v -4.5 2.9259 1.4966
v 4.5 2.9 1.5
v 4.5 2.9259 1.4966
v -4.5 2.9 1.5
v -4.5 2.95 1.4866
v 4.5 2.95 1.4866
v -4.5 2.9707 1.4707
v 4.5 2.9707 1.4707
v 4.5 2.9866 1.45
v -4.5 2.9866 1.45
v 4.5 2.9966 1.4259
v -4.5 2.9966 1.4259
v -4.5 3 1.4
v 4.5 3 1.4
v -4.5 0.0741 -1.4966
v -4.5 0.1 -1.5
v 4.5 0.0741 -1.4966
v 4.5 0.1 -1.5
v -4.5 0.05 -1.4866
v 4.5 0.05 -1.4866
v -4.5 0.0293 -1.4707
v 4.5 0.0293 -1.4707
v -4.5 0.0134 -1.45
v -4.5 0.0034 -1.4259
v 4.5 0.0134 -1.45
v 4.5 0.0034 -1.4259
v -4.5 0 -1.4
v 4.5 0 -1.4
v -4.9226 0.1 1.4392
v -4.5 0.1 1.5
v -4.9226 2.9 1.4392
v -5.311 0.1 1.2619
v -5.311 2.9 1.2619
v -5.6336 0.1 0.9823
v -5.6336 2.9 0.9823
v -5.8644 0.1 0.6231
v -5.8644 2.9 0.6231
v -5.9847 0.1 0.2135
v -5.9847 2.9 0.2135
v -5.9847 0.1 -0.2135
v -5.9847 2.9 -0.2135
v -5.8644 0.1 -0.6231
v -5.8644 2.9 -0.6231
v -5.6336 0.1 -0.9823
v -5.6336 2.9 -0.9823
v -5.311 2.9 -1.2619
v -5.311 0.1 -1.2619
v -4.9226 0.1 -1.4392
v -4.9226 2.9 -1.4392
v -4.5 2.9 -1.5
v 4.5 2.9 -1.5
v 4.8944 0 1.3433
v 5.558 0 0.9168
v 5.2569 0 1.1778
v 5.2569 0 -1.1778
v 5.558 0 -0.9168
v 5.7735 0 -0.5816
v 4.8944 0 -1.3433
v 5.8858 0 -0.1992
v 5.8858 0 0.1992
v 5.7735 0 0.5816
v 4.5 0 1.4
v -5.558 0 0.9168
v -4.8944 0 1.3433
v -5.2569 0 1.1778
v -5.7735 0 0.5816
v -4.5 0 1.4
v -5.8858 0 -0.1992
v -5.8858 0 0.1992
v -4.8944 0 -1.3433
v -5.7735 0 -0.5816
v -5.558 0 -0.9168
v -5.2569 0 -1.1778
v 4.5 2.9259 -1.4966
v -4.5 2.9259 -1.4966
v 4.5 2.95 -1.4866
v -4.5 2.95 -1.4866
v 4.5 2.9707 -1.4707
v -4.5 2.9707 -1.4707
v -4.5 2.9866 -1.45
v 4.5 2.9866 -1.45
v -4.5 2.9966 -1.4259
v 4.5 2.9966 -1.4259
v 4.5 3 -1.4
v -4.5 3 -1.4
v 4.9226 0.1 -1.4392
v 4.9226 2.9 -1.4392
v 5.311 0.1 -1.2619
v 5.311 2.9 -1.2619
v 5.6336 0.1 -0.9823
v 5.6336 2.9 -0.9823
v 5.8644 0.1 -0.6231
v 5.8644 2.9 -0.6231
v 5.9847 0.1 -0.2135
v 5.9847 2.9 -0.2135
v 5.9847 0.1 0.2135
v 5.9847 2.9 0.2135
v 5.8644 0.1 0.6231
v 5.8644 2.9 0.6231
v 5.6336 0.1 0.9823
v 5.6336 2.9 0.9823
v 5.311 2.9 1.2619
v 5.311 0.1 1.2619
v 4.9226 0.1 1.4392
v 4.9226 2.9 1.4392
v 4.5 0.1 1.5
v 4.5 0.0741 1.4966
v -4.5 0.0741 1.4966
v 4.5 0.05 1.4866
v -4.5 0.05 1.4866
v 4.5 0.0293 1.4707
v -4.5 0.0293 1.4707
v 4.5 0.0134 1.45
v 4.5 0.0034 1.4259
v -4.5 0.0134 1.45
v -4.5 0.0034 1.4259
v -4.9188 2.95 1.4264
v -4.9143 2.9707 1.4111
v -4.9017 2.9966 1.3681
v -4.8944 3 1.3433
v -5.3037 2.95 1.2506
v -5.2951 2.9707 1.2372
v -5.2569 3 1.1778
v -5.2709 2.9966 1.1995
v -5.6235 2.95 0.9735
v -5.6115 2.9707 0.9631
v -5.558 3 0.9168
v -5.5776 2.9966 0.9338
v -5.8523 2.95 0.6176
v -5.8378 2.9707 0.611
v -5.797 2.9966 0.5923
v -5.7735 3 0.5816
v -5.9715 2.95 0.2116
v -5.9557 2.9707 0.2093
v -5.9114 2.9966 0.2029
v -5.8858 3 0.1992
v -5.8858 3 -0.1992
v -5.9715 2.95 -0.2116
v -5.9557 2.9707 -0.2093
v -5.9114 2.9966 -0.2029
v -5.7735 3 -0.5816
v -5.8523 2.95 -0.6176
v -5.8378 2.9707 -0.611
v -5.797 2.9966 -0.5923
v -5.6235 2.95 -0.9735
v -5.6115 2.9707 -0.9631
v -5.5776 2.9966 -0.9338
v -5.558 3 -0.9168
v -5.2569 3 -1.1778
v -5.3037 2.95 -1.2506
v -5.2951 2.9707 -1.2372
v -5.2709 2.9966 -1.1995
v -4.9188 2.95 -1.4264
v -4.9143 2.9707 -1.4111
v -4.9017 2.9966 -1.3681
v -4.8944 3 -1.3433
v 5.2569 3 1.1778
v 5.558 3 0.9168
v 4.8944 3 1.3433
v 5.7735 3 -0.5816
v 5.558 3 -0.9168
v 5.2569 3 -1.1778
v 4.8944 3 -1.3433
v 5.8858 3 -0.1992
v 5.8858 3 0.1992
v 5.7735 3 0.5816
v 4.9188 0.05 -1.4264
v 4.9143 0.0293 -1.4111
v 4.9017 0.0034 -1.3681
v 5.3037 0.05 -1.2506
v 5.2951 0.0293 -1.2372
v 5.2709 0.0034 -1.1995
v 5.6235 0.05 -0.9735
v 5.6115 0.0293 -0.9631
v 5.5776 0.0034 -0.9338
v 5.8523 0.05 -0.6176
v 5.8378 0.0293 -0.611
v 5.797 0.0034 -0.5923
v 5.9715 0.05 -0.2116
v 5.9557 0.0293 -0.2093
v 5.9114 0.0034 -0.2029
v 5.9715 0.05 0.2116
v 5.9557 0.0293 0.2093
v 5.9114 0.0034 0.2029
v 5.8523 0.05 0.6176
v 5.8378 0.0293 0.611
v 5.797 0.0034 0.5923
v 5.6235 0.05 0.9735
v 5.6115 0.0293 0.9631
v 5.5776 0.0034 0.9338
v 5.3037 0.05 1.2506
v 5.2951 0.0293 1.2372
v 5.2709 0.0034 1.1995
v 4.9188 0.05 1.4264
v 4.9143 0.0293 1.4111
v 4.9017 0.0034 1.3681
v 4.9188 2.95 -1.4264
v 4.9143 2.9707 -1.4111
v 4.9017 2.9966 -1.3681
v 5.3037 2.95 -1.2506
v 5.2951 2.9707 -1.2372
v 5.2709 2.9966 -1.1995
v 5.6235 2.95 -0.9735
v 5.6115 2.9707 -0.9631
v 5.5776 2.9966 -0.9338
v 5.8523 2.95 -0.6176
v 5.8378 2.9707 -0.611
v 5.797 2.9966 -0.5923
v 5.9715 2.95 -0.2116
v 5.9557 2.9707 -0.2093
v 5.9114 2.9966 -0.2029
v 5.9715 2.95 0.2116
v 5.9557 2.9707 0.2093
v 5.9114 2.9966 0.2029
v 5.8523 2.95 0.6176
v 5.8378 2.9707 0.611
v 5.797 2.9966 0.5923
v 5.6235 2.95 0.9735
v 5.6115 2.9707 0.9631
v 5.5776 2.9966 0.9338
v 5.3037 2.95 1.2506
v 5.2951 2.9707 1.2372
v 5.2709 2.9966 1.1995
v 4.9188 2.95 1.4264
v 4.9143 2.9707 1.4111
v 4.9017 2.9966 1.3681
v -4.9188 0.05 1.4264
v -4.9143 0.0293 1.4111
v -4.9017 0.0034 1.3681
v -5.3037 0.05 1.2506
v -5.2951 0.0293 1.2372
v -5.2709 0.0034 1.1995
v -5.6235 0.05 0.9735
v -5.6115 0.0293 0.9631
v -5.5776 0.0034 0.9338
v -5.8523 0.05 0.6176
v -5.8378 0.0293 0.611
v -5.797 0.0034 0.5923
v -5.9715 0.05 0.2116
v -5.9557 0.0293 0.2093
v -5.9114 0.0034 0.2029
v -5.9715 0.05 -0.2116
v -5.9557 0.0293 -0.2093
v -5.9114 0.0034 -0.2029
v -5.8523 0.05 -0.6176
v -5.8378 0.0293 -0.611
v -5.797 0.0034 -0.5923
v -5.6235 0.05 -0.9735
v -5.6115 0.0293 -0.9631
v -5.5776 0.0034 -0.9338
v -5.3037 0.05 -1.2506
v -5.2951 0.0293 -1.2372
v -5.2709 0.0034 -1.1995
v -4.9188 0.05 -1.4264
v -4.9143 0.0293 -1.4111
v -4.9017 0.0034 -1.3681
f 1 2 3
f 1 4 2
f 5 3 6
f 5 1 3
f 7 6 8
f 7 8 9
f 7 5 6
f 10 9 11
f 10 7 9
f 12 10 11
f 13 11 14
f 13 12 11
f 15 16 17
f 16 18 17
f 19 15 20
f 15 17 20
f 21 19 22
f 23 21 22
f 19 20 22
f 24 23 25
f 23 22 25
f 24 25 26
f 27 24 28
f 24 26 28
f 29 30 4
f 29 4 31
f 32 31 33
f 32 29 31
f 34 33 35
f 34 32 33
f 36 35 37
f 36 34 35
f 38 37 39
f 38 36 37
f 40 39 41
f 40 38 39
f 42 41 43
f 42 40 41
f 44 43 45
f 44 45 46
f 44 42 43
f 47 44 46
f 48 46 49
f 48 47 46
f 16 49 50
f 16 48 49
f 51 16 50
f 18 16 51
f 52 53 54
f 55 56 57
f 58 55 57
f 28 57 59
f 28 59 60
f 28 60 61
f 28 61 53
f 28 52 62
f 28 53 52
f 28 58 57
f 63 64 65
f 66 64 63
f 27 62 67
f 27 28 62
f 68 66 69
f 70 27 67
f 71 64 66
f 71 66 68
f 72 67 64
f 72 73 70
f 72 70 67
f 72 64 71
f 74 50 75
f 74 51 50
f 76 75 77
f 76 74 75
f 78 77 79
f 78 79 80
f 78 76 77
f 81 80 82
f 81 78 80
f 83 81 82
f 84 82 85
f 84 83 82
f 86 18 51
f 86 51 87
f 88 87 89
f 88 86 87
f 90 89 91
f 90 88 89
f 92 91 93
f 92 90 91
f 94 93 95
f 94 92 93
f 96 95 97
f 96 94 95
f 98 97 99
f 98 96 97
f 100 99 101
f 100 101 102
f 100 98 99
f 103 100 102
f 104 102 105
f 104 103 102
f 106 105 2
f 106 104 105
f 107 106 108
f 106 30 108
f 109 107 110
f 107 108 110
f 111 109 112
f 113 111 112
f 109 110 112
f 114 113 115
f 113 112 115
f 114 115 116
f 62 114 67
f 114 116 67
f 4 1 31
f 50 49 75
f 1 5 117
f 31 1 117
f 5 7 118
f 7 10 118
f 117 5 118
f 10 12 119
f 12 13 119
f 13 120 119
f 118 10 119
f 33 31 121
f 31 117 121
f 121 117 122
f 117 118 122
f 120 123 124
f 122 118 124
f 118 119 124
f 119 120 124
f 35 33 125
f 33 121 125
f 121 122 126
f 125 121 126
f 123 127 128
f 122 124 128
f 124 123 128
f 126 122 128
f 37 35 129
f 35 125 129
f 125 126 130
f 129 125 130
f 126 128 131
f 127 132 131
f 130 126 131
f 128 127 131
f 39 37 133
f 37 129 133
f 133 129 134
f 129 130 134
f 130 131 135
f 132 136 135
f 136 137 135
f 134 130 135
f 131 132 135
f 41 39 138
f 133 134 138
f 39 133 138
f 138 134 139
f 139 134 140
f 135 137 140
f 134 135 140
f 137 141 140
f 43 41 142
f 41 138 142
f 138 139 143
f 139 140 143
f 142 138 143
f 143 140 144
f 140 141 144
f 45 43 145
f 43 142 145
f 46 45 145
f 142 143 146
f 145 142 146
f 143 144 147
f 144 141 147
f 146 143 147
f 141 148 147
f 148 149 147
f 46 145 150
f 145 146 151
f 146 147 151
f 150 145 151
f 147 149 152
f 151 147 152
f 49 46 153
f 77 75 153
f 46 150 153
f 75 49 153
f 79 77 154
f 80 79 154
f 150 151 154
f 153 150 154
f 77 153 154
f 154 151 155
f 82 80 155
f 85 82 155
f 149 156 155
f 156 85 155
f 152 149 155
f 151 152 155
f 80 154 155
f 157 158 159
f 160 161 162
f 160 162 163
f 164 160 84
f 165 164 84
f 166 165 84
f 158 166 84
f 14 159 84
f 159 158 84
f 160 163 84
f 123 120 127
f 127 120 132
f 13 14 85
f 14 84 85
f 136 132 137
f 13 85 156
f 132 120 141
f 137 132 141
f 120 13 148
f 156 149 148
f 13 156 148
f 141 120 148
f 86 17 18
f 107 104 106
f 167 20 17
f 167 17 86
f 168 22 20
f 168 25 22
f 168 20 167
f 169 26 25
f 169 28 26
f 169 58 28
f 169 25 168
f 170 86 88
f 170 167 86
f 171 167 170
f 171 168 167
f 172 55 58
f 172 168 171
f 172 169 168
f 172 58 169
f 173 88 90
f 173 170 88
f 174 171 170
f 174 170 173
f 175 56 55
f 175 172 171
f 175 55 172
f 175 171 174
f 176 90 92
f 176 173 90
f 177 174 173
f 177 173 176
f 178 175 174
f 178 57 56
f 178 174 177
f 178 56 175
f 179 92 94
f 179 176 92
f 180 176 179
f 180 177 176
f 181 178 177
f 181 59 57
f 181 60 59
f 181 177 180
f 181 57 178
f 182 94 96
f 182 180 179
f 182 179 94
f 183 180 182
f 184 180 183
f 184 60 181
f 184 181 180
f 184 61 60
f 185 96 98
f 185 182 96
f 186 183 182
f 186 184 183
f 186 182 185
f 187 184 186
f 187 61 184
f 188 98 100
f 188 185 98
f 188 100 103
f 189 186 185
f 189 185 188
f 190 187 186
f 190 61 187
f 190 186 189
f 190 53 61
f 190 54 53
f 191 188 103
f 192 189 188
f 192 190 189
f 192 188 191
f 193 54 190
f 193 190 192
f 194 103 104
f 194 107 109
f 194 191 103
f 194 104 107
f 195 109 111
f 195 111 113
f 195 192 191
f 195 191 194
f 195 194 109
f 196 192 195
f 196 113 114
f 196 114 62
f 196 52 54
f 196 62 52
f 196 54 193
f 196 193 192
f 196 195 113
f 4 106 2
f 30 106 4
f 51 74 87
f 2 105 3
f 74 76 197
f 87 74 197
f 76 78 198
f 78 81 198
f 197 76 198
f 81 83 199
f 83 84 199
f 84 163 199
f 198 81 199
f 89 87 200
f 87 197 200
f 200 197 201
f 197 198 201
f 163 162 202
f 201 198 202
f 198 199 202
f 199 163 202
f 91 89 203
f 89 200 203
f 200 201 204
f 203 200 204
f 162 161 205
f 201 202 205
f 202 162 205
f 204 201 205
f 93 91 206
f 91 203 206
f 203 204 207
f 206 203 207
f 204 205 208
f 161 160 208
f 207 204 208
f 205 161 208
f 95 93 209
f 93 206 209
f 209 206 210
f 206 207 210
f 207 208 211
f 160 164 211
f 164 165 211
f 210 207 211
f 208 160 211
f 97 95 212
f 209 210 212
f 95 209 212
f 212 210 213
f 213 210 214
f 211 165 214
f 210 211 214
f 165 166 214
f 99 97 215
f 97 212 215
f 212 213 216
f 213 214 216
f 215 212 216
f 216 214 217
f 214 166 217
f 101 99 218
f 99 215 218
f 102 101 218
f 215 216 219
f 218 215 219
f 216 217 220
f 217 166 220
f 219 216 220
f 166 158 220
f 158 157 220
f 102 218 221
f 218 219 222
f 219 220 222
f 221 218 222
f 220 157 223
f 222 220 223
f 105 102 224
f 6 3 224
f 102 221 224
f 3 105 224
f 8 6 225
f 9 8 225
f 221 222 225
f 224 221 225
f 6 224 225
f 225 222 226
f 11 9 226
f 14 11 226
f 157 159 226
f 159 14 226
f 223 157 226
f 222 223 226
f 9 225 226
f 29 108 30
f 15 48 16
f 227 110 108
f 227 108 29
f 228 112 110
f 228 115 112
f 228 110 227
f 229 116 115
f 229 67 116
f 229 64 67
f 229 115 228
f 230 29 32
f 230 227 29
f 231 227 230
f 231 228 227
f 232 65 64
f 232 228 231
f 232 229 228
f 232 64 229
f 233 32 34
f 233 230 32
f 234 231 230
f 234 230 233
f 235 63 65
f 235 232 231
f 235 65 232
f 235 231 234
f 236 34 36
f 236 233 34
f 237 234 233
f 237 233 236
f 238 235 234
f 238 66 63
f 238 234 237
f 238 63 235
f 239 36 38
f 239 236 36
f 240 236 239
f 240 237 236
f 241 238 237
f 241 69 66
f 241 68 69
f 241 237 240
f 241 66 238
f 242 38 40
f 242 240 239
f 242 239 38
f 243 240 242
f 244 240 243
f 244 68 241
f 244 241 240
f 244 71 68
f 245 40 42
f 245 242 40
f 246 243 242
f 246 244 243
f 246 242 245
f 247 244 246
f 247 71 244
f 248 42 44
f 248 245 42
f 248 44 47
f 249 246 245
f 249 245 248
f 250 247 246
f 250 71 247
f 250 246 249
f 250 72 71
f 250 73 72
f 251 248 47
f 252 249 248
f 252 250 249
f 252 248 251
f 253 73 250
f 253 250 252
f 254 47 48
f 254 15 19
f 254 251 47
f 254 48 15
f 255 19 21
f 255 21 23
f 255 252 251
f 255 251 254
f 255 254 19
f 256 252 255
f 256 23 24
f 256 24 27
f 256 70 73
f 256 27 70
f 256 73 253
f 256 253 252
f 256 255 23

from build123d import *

# Parameters (mm, degrees)
BOSS_EXTRU_1_DEPTH = 3
CONG_1_R           = 0.1


with BuildPart() as part:
    # Esquisse1 → Boss.-Extru.1 (new body)
    with BuildSketch(Plane(origin=(0, 0, 0), x_dir=(1, 0, 0), z_dir=(0, 1, 0))):
        with BuildLine():
            Line((4.5, -1.5), (-4.5, -1.5))
            ThreePointArc((-4.5, -1.5), (-6, 0), (-4.5, 1.5))
            Line((-4.5, 1.5), (4.5, 1.5))
            ThreePointArc((4.5, 1.5), (6, 0), (4.5, -1.5))
        make_face()
    extrude(amount=BOSS_EXTRU_1_DEPTH)

    # Congé1
    cong_1_edges = [part.edges().sort_by_distance(p)[0] for p in [
        (-6, 3, 0),
        (0, 3, 1.5),
        (6, 3, 0),
        (0, 0, 1.5),
        (-6, 0, 0),
        (0, 0, -1.5),
        (6, 0, 0),
        (0, 3, -1.5),
    ]]
    fillet(cong_1_edges, radius=CONG_1_R)


solid = part.part
